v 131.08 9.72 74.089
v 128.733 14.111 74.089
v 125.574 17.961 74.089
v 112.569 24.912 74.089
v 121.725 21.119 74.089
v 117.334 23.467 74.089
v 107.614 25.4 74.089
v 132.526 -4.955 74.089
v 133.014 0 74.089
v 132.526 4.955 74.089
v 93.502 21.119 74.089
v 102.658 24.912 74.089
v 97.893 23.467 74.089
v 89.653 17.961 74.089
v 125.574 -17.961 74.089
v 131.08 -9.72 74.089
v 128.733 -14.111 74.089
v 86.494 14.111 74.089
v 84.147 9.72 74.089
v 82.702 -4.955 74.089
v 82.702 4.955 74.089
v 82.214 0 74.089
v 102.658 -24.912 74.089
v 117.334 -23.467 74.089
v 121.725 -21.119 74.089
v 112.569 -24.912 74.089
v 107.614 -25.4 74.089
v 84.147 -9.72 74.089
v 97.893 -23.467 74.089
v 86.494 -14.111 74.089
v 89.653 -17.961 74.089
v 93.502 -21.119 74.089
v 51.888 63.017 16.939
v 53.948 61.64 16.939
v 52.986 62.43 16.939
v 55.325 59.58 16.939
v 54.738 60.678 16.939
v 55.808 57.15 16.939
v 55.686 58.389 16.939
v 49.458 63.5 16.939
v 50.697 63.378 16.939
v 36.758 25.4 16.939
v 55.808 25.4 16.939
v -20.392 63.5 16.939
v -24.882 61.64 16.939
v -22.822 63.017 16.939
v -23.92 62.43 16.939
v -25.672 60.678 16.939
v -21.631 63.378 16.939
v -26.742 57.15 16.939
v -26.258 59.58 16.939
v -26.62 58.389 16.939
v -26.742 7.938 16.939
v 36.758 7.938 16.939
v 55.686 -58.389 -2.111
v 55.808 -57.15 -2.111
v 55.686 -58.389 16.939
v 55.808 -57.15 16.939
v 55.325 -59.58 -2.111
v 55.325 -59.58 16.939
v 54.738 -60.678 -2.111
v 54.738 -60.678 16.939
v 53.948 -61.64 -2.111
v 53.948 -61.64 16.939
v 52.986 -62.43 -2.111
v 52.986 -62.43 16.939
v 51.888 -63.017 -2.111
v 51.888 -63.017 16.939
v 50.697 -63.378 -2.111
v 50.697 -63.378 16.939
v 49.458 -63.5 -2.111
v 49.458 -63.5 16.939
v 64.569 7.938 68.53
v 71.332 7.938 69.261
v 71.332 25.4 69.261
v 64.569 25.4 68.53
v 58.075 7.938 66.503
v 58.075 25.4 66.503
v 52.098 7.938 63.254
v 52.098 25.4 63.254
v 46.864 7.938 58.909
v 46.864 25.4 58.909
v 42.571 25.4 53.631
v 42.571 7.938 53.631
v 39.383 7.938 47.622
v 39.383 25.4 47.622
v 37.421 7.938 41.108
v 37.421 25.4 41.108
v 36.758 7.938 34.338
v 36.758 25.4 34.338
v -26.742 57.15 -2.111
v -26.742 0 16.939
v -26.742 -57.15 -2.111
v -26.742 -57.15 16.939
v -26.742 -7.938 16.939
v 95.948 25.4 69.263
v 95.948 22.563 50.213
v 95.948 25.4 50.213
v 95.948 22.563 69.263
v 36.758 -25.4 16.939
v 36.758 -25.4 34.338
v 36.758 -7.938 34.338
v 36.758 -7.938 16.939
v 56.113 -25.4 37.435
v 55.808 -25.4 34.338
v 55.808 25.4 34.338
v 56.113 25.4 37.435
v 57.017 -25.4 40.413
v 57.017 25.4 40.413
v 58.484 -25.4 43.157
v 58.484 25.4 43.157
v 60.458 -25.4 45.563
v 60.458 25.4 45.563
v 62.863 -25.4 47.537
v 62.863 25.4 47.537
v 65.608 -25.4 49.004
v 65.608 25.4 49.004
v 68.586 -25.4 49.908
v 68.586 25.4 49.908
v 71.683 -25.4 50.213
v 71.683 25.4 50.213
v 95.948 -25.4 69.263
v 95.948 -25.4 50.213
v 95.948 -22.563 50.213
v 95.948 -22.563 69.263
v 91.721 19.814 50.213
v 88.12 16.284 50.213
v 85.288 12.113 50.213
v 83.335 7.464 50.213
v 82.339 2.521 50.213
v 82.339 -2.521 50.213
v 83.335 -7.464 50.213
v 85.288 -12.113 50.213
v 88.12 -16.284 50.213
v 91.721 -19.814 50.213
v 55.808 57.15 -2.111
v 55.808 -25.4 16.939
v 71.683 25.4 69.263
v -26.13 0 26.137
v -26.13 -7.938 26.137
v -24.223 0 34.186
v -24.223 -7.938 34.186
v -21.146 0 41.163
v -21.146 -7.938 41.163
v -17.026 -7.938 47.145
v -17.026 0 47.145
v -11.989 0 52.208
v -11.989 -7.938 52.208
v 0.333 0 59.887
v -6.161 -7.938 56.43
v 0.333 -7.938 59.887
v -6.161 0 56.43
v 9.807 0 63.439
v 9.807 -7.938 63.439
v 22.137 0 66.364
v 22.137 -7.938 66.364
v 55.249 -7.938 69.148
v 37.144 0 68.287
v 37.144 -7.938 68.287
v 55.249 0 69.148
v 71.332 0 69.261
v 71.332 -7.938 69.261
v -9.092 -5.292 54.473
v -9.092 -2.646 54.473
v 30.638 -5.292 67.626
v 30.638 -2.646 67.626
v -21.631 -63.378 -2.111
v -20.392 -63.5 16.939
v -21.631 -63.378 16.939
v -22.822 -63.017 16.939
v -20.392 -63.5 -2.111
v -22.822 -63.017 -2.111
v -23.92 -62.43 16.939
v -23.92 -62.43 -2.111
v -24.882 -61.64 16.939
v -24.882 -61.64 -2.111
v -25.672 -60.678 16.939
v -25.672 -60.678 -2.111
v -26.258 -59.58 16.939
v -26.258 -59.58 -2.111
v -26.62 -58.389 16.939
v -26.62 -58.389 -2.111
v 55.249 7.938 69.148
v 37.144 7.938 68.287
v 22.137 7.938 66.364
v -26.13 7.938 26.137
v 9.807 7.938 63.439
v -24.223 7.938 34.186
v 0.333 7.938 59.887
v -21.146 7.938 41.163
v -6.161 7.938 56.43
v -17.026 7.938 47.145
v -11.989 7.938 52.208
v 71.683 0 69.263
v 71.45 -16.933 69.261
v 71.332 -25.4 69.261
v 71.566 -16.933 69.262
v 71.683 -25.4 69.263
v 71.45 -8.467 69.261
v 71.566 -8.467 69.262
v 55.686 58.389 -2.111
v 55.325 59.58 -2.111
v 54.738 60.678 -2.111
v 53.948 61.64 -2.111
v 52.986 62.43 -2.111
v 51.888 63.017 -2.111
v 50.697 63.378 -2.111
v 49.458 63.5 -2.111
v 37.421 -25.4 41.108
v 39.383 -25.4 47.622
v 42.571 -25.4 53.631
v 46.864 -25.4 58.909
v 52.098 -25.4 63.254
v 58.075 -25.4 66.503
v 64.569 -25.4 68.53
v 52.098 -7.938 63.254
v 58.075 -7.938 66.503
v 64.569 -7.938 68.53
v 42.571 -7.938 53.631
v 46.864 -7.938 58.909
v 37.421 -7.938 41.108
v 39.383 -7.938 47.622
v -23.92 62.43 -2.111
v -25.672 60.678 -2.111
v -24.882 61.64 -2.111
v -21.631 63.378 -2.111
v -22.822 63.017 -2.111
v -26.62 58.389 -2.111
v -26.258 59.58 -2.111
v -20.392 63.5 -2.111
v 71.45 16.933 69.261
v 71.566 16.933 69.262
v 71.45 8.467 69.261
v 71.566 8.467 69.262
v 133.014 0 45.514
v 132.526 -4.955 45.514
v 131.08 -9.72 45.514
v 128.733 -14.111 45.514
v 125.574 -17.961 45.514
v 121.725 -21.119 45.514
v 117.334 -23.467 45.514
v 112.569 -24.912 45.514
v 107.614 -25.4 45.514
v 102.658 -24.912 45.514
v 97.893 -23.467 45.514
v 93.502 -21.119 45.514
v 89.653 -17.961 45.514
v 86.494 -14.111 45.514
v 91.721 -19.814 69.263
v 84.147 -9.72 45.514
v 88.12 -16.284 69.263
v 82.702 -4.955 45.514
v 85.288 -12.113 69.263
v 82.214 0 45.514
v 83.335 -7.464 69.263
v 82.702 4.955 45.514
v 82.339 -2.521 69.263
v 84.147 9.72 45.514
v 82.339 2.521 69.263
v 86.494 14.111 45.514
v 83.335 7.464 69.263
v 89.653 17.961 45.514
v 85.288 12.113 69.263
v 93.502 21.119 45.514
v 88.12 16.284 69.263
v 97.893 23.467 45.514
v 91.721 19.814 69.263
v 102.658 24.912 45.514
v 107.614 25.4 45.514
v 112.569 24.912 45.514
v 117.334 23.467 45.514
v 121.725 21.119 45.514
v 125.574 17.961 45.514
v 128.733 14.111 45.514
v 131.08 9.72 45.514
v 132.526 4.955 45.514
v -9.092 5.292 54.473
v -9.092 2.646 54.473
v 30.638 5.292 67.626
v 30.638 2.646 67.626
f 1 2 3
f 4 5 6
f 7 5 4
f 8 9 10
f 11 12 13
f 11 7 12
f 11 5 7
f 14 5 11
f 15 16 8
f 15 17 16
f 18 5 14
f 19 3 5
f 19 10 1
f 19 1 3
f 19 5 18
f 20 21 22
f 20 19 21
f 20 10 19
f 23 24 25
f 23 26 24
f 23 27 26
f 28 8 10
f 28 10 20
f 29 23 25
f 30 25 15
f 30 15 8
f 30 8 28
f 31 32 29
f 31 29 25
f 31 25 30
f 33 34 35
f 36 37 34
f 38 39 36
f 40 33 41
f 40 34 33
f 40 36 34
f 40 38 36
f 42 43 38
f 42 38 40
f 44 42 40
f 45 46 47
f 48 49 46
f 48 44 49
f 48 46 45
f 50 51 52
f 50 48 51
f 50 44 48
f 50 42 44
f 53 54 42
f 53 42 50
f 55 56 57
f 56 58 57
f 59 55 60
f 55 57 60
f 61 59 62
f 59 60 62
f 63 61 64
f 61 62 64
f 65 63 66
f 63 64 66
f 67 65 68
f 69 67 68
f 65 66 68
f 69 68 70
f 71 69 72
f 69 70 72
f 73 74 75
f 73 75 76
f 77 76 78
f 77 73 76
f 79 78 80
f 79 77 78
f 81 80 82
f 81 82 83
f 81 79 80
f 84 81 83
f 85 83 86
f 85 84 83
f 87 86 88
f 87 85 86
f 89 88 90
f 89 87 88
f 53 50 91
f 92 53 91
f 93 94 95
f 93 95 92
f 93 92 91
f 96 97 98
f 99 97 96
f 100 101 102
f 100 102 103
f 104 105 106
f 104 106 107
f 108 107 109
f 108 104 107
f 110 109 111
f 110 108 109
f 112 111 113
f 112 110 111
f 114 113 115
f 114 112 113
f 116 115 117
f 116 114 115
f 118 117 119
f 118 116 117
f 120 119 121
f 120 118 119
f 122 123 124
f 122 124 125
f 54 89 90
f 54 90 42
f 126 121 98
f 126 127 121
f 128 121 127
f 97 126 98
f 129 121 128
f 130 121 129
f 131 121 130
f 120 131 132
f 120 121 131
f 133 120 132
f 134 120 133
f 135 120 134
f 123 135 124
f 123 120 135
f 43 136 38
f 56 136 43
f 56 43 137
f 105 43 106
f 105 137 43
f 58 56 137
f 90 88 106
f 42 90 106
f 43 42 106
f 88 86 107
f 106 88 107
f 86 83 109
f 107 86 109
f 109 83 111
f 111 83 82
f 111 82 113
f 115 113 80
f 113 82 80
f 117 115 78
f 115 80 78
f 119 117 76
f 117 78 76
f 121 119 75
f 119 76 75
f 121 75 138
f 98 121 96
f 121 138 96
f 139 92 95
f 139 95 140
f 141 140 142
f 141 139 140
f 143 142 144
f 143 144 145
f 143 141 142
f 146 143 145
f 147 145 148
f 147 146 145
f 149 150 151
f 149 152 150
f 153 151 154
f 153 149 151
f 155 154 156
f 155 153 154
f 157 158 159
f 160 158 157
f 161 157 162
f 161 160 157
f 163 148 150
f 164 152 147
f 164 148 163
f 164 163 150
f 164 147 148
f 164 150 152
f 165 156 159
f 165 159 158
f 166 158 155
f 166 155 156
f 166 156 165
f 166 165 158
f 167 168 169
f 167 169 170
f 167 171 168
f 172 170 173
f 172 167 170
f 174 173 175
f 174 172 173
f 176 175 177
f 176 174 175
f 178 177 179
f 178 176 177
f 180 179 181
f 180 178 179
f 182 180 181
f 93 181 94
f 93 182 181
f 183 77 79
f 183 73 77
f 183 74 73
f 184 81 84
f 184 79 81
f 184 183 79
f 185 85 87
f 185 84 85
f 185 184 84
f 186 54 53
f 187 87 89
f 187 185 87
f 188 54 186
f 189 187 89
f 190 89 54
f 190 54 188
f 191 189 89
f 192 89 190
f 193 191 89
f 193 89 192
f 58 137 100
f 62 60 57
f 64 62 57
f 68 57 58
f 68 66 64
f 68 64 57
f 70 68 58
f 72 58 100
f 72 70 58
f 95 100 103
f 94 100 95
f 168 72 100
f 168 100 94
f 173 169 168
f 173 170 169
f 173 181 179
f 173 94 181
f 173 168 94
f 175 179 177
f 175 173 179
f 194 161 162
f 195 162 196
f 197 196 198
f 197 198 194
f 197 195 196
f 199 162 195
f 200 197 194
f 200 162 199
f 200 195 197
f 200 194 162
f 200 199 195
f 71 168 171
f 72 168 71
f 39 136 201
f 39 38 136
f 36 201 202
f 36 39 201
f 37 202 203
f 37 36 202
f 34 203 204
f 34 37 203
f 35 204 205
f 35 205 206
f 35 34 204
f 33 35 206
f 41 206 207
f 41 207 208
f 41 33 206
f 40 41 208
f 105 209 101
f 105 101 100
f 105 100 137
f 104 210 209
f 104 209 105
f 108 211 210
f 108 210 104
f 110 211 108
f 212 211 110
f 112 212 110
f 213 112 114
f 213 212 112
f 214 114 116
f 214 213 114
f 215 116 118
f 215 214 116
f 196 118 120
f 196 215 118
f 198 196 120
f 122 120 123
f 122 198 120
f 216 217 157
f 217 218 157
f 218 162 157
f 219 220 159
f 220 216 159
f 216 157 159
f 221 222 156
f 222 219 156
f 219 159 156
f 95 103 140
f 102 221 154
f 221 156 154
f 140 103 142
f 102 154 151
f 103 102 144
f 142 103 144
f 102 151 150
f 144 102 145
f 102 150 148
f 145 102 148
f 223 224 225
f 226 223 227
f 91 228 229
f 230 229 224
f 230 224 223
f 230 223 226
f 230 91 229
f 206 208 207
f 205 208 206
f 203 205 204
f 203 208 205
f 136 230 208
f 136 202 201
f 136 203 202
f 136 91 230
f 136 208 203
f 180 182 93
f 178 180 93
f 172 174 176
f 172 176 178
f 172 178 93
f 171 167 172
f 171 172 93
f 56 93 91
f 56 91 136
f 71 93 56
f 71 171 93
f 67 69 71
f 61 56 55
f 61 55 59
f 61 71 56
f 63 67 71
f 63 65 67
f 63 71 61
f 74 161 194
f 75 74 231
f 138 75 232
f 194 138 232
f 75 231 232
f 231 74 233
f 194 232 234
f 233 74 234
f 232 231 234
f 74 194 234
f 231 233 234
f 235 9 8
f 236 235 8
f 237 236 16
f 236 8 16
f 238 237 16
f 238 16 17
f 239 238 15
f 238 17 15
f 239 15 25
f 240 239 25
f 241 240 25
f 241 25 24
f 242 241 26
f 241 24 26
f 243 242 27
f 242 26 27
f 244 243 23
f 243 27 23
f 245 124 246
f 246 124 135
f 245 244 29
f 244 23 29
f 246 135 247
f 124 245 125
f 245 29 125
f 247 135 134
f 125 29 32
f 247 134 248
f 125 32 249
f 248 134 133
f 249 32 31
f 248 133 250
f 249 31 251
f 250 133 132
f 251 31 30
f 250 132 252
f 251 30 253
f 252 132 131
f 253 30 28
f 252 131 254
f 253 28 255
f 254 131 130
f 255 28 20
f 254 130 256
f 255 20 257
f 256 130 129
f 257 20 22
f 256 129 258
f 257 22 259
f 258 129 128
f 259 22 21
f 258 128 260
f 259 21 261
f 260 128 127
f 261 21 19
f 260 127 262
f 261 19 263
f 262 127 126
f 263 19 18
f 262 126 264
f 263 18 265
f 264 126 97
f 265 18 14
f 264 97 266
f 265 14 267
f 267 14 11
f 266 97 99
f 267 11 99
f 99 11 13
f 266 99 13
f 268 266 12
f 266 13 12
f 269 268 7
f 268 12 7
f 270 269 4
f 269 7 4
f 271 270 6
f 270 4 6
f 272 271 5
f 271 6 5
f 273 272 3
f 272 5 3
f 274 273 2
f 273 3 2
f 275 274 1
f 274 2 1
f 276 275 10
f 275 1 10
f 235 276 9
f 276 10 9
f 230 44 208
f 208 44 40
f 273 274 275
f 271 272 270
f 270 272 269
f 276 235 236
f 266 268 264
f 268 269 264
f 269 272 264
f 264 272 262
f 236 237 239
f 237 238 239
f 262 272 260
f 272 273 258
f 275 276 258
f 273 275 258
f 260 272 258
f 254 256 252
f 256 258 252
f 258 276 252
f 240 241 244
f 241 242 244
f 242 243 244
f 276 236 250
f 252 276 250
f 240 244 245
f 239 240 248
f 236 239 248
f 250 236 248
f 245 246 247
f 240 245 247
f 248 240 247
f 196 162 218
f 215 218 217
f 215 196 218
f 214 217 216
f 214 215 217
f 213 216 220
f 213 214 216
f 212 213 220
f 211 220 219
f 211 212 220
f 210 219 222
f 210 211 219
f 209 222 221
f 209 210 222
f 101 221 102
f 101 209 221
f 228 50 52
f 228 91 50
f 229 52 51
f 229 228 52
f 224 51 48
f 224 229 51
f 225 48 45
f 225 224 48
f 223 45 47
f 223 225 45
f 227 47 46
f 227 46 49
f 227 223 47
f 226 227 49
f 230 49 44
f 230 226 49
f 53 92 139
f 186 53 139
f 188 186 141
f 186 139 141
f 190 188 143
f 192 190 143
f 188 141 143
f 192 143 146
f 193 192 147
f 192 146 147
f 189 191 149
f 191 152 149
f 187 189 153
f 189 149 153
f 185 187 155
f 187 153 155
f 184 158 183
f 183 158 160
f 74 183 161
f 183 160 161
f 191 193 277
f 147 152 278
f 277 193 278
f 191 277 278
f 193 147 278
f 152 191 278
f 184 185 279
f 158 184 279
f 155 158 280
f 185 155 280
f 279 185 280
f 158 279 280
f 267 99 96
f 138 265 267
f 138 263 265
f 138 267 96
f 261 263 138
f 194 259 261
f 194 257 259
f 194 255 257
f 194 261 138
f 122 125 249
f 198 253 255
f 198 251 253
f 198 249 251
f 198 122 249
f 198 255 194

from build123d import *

# Parameters (mm, degrees)
F1_DEPTH = 63.5
F0_W     = 13.734161
F0_H     = 19.05
F2_DEPTH = 25.4
F3_DEPTH = 7.9375
F0_W_2   = 25.4
F0_H_2   = 28.575
F5_R     = 6.35


with BuildPart() as f1:
    # F0 (on Front) → F1 (new body, symmetric)
    with BuildSketch(Plane.XZ):
        Polygon((36.758158, 16.938625), (-26.741842, 16.938625), (-26.741842, -2.111375), (55.808158, -2.111375), (55.808158, 16.938625), align=None)
    extrude(amount=F1_DEPTH, both=True)

    # F0 (on Front) → F2 (join, symmetric)
    with BuildSketch(Plane.XZ):
        with BuildLine():
            Line((36.758158, 34.337625), (36.758158, 16.938625))
            Line((36.758158, 16.938625), (55.808158, 16.938625))
            Line((55.808158, 16.938625), (55.808158, 34.337625))
            ThreePointArc((55.808158, 34.337625), (60.457838, 45.562945), (71.683158, 50.212625))
            Line((71.683158, 50.212625), (82.213558, 50.212625))
            Line((82.213558, 50.212625), (82.213558, 69.262625))
            Line((82.213558, 69.262625), (71.683158, 69.262625))
            add(Edge.make_bspline(
                [(71.332357, 69.260863), (71.449649, 69.261426), (71.566584, 69.262012), (71.683158, 69.262625)],
                knots=[111.087067, 111.087067, 111.087067, 111.087067, 111.468747, 111.468747, 111.468747, 111.468747], degree=3))
            ThreePointArc((71.332357, 69.260863), (46.863737, 58.908989), (36.758158, 34.337625))
        make_face()
        with Locations((89.080638, 59.737625)):
            Rectangle(F0_W, F0_H)
    extrude(amount=F2_DEPTH, both=True)

    # F0 (on Front) → F3 (join, symmetric)
    with BuildSketch(Plane.XZ):
        with BuildLine():
            add(Edge.make_bspline(
                [(-26.741842, 16.938625), (-27.171182, 70.95094), (37.19487, 69.097097), (71.332357, 69.260863)],
                knots=[0, 0, 0, 0, 111.087067, 111.087067, 111.087067, 111.087067], degree=3))
            Line((-26.741842, 16.938625), (36.758158, 16.938625))
            Line((36.758158, 16.938625), (36.758158, 34.337625))
            ThreePointArc((36.758158, 34.337625), (46.863737, 58.908989), (71.332357, 69.260863))
        make_face()
    extrude(amount=F3_DEPTH, both=True)

    # F0 (on Front) → F4 (revolve)
    with BuildSketch(Plane.XZ):
        with Locations((120.313558, 59.801125)):
            Rectangle(F0_W_2, F0_H_2)
    revolve(axis=Axis((107.613558, 0, 59.801125), (0, 0, -1)))

    # F5
    f5_edges = [f1.edges().sort_by_distance(p)[0] for p in [
        (-26.741842, -63.5, 7.413625),
        (55.808158, -63.5, 7.413625),
        (55.808158, 63.5, 7.413625),
        (-26.741842, 63.5, 7.413625),
    ]]
    fillet(f5_edges, radius=F5_R)


solid = f1.part
